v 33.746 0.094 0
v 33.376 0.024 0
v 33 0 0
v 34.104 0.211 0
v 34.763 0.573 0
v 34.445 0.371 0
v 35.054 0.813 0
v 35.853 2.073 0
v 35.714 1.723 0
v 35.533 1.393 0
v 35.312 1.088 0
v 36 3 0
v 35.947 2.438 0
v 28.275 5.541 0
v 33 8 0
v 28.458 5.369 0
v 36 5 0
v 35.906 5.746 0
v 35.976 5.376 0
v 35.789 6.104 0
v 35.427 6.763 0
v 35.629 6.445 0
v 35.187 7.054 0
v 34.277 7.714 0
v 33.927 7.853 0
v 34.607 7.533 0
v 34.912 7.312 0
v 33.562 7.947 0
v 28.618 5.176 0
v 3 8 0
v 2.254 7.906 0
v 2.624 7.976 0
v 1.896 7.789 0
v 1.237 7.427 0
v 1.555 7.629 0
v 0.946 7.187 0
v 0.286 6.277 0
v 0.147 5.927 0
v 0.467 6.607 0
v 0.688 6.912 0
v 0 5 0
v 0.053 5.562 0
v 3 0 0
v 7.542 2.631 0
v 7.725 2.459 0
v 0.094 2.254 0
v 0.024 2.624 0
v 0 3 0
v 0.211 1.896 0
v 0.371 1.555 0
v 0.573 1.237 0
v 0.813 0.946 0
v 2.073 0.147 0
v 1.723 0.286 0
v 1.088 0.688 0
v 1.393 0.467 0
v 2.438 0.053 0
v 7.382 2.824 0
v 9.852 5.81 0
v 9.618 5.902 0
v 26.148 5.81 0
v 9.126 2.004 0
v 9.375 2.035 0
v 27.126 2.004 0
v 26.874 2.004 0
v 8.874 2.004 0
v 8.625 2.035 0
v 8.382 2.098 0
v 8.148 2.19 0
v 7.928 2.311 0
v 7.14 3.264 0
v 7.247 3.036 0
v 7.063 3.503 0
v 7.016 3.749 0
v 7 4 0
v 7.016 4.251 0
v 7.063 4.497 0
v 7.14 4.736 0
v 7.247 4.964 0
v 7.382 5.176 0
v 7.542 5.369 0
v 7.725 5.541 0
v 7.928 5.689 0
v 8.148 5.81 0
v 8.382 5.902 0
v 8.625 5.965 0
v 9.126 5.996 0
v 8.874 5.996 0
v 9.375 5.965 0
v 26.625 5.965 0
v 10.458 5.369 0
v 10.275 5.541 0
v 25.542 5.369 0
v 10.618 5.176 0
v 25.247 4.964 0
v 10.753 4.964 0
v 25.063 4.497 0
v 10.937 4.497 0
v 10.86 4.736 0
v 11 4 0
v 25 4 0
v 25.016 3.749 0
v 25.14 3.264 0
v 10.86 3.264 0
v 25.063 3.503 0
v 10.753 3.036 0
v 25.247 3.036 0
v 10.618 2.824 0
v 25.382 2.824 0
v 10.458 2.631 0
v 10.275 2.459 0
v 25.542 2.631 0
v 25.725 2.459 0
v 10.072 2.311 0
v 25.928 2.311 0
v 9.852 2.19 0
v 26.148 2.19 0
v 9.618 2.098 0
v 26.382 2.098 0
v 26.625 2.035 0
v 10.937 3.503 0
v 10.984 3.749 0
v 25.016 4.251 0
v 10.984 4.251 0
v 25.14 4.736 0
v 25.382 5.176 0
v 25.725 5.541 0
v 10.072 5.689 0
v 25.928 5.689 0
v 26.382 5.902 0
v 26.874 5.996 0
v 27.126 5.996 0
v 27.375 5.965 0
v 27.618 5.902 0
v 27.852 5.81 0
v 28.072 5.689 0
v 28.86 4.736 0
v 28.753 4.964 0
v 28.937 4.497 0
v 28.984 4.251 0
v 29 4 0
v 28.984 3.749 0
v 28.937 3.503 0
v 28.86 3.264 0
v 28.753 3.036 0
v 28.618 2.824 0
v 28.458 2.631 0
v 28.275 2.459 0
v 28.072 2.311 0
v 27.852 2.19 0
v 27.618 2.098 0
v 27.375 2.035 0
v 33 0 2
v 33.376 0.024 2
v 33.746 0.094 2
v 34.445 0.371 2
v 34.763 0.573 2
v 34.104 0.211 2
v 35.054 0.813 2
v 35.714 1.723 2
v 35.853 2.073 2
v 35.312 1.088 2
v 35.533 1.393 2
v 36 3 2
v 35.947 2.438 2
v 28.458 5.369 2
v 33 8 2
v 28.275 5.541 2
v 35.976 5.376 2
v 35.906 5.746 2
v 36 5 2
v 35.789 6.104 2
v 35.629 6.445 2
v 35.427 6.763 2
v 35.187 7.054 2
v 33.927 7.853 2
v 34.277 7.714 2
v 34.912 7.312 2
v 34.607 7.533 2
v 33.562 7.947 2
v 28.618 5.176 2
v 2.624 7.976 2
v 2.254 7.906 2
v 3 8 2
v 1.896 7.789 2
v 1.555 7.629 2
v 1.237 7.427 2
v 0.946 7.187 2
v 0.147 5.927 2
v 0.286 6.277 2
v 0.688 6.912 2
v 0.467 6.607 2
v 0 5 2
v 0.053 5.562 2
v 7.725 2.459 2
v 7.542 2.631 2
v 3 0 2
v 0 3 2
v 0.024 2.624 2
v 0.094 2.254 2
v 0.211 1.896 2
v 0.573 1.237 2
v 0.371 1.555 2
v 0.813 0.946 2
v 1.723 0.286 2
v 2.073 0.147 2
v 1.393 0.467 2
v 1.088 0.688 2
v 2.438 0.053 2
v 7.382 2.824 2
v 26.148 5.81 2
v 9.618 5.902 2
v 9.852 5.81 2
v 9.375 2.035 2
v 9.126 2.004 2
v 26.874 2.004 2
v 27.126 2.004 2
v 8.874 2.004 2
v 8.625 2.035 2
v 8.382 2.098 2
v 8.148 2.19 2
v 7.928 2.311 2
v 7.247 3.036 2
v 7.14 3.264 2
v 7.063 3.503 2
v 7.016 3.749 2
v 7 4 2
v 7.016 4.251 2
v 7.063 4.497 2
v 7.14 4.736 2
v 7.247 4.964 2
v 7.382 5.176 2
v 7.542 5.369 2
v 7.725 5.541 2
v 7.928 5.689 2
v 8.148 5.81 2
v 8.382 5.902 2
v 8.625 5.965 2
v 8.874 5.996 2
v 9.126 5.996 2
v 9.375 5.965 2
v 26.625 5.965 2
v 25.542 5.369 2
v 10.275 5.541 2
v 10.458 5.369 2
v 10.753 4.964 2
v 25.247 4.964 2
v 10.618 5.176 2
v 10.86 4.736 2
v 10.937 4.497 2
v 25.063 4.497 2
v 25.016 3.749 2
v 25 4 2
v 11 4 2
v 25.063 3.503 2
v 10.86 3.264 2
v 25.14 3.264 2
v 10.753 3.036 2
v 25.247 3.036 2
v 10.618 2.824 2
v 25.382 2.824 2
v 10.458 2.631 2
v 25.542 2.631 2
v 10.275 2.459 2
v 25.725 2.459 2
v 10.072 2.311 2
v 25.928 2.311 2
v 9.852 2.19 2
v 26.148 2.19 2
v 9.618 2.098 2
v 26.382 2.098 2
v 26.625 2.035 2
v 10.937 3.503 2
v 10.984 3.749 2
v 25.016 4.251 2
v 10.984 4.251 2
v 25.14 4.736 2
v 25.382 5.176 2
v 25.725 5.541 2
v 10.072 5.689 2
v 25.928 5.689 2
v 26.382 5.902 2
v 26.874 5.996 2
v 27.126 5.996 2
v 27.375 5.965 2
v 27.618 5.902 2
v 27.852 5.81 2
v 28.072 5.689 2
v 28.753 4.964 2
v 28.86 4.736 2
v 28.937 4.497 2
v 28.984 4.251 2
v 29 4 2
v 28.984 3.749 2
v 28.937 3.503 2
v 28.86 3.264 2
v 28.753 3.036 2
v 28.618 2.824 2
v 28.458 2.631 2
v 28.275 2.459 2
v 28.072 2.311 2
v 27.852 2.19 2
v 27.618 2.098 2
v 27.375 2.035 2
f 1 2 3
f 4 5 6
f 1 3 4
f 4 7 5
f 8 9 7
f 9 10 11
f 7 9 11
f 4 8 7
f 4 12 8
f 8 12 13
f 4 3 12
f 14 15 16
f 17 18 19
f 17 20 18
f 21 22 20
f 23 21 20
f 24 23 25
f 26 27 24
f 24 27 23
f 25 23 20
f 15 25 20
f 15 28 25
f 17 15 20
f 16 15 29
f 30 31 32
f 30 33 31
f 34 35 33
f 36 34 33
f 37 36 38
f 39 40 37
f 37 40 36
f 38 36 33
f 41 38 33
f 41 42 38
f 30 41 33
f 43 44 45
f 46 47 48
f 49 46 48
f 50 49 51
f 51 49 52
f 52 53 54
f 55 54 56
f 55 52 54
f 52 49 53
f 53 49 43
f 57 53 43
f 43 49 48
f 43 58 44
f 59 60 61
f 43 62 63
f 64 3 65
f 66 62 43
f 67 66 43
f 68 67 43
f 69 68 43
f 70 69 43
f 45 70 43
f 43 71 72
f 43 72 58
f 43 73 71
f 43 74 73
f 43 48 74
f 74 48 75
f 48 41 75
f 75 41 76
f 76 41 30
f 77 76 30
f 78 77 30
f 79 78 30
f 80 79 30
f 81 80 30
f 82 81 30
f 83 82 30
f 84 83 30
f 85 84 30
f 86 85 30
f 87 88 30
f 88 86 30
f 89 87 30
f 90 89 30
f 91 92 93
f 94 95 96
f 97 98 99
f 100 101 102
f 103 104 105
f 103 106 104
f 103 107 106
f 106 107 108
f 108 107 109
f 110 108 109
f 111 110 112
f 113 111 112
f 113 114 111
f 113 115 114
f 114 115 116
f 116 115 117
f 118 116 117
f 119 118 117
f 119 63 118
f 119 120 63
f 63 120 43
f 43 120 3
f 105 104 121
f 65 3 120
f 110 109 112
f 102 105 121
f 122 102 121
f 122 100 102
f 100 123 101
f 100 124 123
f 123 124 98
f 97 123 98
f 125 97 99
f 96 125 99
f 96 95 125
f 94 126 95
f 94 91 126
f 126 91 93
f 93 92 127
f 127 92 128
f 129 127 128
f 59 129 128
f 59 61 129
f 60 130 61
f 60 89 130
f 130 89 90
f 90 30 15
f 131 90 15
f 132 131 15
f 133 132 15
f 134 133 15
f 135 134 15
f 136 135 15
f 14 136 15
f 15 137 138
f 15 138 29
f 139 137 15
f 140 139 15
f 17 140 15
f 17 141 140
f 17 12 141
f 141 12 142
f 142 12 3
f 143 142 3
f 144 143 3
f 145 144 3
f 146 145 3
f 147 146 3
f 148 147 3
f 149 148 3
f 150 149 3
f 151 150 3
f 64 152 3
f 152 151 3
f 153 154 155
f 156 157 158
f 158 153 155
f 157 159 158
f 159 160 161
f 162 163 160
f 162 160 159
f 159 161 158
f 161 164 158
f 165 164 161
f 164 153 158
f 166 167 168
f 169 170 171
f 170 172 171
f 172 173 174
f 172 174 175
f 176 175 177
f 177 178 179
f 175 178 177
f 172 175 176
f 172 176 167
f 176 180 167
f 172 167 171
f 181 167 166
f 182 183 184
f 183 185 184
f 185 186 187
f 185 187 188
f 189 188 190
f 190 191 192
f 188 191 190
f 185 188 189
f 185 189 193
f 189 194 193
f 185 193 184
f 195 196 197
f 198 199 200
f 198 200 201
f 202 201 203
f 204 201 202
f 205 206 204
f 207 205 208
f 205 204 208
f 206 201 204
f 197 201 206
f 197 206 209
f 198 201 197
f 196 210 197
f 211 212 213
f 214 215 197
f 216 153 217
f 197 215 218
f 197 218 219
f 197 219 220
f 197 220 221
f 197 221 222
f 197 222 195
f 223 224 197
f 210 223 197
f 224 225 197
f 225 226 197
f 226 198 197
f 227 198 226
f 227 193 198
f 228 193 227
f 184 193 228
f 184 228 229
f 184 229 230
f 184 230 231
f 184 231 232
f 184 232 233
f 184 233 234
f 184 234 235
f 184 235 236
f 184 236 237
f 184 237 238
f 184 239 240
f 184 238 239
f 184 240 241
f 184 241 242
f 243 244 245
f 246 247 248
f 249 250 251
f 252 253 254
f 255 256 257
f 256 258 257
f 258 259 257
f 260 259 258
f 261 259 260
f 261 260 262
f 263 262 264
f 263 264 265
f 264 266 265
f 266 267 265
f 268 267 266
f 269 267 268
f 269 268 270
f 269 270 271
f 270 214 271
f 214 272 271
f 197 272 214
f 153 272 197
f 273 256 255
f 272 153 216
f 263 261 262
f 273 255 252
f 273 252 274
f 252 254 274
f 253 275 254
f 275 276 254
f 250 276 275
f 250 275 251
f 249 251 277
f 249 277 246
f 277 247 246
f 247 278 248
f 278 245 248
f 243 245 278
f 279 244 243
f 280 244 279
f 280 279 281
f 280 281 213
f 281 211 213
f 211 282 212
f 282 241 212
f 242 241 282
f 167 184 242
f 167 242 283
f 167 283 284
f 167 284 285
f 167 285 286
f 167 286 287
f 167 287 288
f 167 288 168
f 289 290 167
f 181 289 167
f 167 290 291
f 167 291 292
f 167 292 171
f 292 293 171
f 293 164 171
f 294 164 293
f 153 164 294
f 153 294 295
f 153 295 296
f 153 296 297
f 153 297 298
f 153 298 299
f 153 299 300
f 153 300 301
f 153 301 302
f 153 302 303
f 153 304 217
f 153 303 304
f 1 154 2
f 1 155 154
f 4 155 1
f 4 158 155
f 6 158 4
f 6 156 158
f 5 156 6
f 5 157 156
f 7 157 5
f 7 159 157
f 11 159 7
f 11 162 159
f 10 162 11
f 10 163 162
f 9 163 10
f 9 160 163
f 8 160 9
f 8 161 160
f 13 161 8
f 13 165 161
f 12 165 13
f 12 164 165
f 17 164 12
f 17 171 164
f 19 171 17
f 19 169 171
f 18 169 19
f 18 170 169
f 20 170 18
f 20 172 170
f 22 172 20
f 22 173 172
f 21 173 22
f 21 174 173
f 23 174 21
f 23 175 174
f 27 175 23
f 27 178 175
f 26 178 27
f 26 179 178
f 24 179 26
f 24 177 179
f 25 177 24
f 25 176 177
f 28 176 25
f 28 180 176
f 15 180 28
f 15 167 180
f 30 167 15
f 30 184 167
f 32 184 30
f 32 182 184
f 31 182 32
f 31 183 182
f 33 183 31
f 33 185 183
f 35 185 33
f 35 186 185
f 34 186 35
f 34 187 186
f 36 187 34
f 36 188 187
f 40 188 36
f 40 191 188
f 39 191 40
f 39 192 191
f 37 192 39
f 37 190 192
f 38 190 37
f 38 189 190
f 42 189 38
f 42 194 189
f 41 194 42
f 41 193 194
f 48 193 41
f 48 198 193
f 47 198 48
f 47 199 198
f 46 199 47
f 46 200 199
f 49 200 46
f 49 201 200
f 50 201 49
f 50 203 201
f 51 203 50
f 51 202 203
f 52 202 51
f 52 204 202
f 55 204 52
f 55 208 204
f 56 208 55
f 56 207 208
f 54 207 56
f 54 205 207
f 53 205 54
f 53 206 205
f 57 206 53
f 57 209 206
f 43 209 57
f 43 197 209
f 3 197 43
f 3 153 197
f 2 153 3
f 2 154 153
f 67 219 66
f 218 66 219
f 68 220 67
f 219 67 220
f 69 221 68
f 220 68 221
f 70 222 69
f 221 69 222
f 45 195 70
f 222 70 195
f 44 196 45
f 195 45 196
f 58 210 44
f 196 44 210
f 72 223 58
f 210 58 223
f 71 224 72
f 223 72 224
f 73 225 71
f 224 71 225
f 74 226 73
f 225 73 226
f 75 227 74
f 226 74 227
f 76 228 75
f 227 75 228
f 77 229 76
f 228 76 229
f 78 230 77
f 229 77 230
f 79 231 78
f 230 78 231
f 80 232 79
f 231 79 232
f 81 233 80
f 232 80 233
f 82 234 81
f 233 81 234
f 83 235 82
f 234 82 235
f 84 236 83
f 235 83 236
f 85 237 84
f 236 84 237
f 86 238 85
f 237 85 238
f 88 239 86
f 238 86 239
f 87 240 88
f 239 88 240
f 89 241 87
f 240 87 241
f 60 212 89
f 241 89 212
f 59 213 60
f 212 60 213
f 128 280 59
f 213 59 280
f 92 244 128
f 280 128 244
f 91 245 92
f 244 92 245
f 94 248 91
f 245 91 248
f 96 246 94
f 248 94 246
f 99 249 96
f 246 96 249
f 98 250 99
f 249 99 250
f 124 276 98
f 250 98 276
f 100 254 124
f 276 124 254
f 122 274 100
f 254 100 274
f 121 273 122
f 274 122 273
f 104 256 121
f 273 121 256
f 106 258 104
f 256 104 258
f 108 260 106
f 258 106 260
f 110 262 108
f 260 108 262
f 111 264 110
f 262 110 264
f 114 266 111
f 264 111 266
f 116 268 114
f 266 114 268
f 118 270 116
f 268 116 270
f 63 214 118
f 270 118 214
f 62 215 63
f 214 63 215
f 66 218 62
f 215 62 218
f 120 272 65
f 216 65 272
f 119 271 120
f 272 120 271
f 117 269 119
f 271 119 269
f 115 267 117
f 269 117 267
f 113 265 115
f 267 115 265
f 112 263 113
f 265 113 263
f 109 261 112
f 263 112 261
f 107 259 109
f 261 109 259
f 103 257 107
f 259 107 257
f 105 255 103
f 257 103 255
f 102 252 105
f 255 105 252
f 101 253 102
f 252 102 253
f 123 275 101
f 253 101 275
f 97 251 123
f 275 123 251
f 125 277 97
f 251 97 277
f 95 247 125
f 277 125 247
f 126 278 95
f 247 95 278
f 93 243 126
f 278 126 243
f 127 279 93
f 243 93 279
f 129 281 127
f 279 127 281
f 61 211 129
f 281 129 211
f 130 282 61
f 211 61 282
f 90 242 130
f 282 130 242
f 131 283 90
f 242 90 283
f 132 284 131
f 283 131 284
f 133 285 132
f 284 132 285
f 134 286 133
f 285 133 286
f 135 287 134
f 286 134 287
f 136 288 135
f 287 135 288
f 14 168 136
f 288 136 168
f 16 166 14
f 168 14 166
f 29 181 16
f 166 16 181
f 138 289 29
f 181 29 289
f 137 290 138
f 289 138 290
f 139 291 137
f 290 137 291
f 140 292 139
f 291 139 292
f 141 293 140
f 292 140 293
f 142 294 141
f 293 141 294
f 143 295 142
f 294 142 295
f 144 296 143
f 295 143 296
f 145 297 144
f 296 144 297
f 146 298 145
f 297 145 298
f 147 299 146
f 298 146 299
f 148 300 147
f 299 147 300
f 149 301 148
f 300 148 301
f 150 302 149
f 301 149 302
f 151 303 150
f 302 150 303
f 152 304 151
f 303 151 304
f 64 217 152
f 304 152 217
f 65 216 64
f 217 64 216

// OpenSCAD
$fn=50;
linear_extrude(2) {
difference() {
    offset(r=+3) offset(delta=-3) square([36, 8]);
    translate([9, 4]) circle(2);
    translate([27,4]) circle(2);
}
}
